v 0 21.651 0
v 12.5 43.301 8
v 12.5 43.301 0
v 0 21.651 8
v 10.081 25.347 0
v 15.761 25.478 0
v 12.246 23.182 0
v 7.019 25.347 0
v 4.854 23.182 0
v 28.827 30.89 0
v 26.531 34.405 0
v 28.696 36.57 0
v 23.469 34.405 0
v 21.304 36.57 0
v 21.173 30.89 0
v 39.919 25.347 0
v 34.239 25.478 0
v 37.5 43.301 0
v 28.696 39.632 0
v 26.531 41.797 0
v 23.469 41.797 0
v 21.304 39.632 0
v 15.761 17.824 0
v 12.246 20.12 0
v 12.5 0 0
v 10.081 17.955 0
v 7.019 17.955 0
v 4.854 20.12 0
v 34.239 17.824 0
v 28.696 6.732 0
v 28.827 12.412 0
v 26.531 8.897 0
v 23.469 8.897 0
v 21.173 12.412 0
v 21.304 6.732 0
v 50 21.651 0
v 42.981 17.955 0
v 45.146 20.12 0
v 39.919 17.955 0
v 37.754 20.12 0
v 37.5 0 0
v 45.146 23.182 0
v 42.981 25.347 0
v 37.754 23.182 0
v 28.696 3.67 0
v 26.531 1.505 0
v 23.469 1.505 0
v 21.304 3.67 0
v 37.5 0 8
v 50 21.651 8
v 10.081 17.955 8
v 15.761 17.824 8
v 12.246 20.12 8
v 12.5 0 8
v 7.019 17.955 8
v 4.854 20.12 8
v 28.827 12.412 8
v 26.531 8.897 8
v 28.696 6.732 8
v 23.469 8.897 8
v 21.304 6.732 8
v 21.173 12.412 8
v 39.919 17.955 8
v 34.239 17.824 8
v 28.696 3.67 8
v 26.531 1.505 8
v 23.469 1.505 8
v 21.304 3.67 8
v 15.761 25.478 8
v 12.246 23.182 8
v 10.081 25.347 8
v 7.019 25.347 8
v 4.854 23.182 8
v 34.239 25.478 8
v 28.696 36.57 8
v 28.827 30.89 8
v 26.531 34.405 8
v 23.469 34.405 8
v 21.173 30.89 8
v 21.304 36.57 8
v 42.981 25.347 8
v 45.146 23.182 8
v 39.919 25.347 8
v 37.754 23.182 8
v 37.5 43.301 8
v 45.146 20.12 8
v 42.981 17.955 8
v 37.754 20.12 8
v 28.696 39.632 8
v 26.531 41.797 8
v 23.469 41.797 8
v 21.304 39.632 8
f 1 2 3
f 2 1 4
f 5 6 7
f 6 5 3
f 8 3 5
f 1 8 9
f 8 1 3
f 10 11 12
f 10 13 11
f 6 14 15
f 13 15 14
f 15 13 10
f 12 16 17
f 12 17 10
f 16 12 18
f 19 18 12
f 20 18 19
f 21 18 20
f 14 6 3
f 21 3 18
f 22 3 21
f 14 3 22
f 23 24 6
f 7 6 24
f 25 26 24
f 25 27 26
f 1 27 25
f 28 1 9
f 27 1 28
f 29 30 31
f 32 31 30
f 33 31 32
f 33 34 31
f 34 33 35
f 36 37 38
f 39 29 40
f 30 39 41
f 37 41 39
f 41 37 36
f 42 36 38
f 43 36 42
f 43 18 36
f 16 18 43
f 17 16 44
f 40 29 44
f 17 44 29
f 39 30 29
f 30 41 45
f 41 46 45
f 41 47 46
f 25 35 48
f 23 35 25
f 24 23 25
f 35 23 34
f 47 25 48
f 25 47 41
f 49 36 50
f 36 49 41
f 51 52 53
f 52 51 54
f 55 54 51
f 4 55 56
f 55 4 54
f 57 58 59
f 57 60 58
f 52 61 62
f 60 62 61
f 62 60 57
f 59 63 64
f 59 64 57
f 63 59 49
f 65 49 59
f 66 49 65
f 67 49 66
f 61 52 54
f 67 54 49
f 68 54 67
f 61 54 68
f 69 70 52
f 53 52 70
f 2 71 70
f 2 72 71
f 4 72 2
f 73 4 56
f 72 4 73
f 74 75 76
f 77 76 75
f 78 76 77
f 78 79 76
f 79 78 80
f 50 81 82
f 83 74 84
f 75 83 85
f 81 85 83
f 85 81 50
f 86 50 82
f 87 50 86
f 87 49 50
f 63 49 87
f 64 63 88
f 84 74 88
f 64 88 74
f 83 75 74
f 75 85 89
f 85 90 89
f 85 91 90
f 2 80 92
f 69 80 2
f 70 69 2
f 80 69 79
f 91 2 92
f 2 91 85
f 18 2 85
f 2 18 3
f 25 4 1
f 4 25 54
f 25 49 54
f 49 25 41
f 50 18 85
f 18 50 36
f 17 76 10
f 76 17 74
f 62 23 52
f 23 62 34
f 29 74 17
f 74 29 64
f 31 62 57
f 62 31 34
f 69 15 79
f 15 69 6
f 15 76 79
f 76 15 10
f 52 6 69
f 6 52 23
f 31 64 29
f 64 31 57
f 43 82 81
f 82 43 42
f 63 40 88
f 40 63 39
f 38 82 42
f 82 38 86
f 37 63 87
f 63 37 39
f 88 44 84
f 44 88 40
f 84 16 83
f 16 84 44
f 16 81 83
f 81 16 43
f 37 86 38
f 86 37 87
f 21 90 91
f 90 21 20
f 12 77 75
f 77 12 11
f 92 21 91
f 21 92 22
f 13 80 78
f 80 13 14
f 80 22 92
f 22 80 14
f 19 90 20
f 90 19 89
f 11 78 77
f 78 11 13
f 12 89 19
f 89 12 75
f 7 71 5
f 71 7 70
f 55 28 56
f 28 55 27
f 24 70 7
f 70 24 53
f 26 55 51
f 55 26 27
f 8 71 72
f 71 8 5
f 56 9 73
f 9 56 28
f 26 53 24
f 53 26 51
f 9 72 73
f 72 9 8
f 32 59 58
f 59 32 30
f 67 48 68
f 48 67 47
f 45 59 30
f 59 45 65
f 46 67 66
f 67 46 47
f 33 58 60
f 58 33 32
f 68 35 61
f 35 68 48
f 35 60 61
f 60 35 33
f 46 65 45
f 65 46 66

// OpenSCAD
$fn = 32;

// ----------------------------------------------------------------------
// Polygon plate: 6-gon R25, 4 bolt windows
// ----------------------------------------------------------------------

// --- parameters (mm) ---
sides = 6;                // number of polygon sides
plate_r = 25;             // circumscribed radius of the polygon
bore_r = 10;              // centre bore radius
bolts = 4;                // number of bolt windows
ring_r = 16.45;           // bolt-circle radius
bolt_r = 4;               // bolt window radius
plate_t = 8;              // plate thickness, Z (extrusion height)

plate_d = 2 * plate_r;  // circumscribed diameter
bore_d = 2 * bore_r;  // centre bore diameter
bolt_d = 2 * bolt_r;  // bolt window diameter
ring_d = 2 * ring_r;  // bolt-circle diameter

profile = [[50, 21.651], [37.5, 43.301], [12.5, 43.301], [0, 21.651], [12.5, 0], [37.5, 0]];  // primary outline, 6 points, counter clockwise
void_1 = [[34.239, 25.478], [28.827, 30.89], [21.173, 30.89], [15.761, 25.478], [15.761, 17.824], [21.173, 12.412], [28.827, 12.412], [34.239, 17.824]];  // centre bore, 8 points
void_2 = [[45.146, 23.182], [42.981, 25.347], [39.919, 25.347], [37.754, 23.182], [37.754, 20.12], [39.919, 17.955], [42.981, 17.955], [45.146, 20.12]];  // bolt window 1, 8 points
void_3 = [[28.696, 39.632], [26.531, 41.797], [23.469, 41.797], [21.304, 39.632], [21.304, 36.57], [23.469, 34.405], [26.531, 34.405], [28.696, 36.57]];  // bolt window 2, 8 points
void_4 = [[12.246, 23.182], [10.081, 25.347], [7.019, 25.347], [4.854, 23.182], [4.854, 20.12], [7.019, 17.955], [10.081, 17.955], [12.246, 20.12]];  // bolt window 3, 8 points
void_5 = [[28.696, 6.732], [26.531, 8.897], [23.469, 8.897], [21.304, 6.732], [21.304, 3.67], [23.469, 1.505], [26.531, 1.505], [28.696, 3.67]];  // bolt window 4, 8 points

// --- the one profile operation ---
difference() {
  linear_extrude(height = plate_t) polygon(points = profile);
  translate([0, 0, -1])
    linear_extrude(height = plate_t + 2) polygon(points = void_1);
  translate([0, 0, -1])
    linear_extrude(height = plate_t + 2) polygon(points = void_2);
  translate([0, 0, -1])
    linear_extrude(height = plate_t + 2) polygon(points = void_3);
  translate([0, 0, -1])
    linear_extrude(height = plate_t + 2) polygon(points = void_4);
  translate([0, 0, -1])
    linear_extrude(height = plate_t + 2) polygon(points = void_5);
}
